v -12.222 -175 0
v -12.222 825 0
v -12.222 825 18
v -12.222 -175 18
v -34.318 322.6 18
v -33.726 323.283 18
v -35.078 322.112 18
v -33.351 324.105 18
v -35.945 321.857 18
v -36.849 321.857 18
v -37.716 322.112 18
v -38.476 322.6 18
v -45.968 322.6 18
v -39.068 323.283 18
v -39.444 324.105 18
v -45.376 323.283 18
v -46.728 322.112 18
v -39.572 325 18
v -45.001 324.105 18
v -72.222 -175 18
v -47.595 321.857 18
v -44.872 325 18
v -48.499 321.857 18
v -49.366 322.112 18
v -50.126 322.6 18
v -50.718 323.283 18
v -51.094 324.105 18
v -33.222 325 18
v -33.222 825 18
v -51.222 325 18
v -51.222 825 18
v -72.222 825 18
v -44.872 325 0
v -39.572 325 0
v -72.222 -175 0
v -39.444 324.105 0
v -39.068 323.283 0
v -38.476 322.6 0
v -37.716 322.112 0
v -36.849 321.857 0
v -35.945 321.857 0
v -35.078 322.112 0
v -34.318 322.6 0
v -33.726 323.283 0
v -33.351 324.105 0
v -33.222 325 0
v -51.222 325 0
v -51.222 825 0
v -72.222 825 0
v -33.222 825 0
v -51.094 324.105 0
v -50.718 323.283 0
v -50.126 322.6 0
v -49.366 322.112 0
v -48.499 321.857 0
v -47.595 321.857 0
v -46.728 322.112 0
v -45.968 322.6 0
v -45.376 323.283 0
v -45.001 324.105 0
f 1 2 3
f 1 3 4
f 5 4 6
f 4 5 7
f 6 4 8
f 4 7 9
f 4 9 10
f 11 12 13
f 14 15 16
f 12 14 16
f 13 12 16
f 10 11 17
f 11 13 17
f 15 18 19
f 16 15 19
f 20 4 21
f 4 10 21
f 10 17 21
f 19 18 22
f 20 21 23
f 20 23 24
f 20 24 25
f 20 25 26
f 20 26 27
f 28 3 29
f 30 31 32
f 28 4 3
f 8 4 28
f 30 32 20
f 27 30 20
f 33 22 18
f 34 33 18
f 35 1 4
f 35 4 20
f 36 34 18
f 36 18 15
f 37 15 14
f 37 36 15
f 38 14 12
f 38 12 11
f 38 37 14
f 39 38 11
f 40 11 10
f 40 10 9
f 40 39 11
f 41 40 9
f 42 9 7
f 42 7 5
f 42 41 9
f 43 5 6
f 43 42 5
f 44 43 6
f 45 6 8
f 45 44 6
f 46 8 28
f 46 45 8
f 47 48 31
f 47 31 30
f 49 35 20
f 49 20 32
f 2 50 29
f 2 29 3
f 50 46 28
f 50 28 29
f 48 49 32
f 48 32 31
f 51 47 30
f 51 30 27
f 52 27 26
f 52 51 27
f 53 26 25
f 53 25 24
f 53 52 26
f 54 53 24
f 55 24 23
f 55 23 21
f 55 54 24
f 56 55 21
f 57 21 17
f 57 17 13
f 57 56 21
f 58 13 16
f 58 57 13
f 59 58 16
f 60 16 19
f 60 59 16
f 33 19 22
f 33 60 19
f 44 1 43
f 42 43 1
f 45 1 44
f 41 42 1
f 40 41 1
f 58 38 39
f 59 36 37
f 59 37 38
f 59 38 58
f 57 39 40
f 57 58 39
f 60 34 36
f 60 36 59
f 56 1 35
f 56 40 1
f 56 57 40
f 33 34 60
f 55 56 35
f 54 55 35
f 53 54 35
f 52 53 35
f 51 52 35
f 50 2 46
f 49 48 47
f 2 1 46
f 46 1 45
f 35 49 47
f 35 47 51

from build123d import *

# Parameters (mm, degrees)
ESTRUSIONE_ESTRUSIONE1_DEPTH = 18


with BuildPart() as part:
    # Schizzo1 → Estrusione-Estrusione1 (new body)
    with BuildSketch(Plane.XY):
        with BuildLine():
            Line((-51.222222222, 825), (-51.222222222, 325))
            ThreePointArc((-51.222222222, 325), (-48.047222222, 321.825), (-44.872222222, 325))
            Line((-44.872222222, 325), (-39.572222222, 325))
            ThreePointArc((-39.572222222, 325), (-36.397222222, 321.825), (-33.222222222, 325))
            Line((-33.222222222, 325), (-33.222222222, 825))
            Line((-33.222222222, 825), (-12.222222222, 825))
            Line((-12.222222222, 825), (-12.222222222, -175))
            Line((-12.222222222, -175), (-72.222222222, -175))
            Line((-72.222222222, -175), (-72.222222222, 825))
            Line((-72.222222222, 825), (-51.222222222, 825))
        make_face()
    extrude(amount=ESTRUSIONE_ESTRUSIONE1_DEPTH)


solid = part.part
